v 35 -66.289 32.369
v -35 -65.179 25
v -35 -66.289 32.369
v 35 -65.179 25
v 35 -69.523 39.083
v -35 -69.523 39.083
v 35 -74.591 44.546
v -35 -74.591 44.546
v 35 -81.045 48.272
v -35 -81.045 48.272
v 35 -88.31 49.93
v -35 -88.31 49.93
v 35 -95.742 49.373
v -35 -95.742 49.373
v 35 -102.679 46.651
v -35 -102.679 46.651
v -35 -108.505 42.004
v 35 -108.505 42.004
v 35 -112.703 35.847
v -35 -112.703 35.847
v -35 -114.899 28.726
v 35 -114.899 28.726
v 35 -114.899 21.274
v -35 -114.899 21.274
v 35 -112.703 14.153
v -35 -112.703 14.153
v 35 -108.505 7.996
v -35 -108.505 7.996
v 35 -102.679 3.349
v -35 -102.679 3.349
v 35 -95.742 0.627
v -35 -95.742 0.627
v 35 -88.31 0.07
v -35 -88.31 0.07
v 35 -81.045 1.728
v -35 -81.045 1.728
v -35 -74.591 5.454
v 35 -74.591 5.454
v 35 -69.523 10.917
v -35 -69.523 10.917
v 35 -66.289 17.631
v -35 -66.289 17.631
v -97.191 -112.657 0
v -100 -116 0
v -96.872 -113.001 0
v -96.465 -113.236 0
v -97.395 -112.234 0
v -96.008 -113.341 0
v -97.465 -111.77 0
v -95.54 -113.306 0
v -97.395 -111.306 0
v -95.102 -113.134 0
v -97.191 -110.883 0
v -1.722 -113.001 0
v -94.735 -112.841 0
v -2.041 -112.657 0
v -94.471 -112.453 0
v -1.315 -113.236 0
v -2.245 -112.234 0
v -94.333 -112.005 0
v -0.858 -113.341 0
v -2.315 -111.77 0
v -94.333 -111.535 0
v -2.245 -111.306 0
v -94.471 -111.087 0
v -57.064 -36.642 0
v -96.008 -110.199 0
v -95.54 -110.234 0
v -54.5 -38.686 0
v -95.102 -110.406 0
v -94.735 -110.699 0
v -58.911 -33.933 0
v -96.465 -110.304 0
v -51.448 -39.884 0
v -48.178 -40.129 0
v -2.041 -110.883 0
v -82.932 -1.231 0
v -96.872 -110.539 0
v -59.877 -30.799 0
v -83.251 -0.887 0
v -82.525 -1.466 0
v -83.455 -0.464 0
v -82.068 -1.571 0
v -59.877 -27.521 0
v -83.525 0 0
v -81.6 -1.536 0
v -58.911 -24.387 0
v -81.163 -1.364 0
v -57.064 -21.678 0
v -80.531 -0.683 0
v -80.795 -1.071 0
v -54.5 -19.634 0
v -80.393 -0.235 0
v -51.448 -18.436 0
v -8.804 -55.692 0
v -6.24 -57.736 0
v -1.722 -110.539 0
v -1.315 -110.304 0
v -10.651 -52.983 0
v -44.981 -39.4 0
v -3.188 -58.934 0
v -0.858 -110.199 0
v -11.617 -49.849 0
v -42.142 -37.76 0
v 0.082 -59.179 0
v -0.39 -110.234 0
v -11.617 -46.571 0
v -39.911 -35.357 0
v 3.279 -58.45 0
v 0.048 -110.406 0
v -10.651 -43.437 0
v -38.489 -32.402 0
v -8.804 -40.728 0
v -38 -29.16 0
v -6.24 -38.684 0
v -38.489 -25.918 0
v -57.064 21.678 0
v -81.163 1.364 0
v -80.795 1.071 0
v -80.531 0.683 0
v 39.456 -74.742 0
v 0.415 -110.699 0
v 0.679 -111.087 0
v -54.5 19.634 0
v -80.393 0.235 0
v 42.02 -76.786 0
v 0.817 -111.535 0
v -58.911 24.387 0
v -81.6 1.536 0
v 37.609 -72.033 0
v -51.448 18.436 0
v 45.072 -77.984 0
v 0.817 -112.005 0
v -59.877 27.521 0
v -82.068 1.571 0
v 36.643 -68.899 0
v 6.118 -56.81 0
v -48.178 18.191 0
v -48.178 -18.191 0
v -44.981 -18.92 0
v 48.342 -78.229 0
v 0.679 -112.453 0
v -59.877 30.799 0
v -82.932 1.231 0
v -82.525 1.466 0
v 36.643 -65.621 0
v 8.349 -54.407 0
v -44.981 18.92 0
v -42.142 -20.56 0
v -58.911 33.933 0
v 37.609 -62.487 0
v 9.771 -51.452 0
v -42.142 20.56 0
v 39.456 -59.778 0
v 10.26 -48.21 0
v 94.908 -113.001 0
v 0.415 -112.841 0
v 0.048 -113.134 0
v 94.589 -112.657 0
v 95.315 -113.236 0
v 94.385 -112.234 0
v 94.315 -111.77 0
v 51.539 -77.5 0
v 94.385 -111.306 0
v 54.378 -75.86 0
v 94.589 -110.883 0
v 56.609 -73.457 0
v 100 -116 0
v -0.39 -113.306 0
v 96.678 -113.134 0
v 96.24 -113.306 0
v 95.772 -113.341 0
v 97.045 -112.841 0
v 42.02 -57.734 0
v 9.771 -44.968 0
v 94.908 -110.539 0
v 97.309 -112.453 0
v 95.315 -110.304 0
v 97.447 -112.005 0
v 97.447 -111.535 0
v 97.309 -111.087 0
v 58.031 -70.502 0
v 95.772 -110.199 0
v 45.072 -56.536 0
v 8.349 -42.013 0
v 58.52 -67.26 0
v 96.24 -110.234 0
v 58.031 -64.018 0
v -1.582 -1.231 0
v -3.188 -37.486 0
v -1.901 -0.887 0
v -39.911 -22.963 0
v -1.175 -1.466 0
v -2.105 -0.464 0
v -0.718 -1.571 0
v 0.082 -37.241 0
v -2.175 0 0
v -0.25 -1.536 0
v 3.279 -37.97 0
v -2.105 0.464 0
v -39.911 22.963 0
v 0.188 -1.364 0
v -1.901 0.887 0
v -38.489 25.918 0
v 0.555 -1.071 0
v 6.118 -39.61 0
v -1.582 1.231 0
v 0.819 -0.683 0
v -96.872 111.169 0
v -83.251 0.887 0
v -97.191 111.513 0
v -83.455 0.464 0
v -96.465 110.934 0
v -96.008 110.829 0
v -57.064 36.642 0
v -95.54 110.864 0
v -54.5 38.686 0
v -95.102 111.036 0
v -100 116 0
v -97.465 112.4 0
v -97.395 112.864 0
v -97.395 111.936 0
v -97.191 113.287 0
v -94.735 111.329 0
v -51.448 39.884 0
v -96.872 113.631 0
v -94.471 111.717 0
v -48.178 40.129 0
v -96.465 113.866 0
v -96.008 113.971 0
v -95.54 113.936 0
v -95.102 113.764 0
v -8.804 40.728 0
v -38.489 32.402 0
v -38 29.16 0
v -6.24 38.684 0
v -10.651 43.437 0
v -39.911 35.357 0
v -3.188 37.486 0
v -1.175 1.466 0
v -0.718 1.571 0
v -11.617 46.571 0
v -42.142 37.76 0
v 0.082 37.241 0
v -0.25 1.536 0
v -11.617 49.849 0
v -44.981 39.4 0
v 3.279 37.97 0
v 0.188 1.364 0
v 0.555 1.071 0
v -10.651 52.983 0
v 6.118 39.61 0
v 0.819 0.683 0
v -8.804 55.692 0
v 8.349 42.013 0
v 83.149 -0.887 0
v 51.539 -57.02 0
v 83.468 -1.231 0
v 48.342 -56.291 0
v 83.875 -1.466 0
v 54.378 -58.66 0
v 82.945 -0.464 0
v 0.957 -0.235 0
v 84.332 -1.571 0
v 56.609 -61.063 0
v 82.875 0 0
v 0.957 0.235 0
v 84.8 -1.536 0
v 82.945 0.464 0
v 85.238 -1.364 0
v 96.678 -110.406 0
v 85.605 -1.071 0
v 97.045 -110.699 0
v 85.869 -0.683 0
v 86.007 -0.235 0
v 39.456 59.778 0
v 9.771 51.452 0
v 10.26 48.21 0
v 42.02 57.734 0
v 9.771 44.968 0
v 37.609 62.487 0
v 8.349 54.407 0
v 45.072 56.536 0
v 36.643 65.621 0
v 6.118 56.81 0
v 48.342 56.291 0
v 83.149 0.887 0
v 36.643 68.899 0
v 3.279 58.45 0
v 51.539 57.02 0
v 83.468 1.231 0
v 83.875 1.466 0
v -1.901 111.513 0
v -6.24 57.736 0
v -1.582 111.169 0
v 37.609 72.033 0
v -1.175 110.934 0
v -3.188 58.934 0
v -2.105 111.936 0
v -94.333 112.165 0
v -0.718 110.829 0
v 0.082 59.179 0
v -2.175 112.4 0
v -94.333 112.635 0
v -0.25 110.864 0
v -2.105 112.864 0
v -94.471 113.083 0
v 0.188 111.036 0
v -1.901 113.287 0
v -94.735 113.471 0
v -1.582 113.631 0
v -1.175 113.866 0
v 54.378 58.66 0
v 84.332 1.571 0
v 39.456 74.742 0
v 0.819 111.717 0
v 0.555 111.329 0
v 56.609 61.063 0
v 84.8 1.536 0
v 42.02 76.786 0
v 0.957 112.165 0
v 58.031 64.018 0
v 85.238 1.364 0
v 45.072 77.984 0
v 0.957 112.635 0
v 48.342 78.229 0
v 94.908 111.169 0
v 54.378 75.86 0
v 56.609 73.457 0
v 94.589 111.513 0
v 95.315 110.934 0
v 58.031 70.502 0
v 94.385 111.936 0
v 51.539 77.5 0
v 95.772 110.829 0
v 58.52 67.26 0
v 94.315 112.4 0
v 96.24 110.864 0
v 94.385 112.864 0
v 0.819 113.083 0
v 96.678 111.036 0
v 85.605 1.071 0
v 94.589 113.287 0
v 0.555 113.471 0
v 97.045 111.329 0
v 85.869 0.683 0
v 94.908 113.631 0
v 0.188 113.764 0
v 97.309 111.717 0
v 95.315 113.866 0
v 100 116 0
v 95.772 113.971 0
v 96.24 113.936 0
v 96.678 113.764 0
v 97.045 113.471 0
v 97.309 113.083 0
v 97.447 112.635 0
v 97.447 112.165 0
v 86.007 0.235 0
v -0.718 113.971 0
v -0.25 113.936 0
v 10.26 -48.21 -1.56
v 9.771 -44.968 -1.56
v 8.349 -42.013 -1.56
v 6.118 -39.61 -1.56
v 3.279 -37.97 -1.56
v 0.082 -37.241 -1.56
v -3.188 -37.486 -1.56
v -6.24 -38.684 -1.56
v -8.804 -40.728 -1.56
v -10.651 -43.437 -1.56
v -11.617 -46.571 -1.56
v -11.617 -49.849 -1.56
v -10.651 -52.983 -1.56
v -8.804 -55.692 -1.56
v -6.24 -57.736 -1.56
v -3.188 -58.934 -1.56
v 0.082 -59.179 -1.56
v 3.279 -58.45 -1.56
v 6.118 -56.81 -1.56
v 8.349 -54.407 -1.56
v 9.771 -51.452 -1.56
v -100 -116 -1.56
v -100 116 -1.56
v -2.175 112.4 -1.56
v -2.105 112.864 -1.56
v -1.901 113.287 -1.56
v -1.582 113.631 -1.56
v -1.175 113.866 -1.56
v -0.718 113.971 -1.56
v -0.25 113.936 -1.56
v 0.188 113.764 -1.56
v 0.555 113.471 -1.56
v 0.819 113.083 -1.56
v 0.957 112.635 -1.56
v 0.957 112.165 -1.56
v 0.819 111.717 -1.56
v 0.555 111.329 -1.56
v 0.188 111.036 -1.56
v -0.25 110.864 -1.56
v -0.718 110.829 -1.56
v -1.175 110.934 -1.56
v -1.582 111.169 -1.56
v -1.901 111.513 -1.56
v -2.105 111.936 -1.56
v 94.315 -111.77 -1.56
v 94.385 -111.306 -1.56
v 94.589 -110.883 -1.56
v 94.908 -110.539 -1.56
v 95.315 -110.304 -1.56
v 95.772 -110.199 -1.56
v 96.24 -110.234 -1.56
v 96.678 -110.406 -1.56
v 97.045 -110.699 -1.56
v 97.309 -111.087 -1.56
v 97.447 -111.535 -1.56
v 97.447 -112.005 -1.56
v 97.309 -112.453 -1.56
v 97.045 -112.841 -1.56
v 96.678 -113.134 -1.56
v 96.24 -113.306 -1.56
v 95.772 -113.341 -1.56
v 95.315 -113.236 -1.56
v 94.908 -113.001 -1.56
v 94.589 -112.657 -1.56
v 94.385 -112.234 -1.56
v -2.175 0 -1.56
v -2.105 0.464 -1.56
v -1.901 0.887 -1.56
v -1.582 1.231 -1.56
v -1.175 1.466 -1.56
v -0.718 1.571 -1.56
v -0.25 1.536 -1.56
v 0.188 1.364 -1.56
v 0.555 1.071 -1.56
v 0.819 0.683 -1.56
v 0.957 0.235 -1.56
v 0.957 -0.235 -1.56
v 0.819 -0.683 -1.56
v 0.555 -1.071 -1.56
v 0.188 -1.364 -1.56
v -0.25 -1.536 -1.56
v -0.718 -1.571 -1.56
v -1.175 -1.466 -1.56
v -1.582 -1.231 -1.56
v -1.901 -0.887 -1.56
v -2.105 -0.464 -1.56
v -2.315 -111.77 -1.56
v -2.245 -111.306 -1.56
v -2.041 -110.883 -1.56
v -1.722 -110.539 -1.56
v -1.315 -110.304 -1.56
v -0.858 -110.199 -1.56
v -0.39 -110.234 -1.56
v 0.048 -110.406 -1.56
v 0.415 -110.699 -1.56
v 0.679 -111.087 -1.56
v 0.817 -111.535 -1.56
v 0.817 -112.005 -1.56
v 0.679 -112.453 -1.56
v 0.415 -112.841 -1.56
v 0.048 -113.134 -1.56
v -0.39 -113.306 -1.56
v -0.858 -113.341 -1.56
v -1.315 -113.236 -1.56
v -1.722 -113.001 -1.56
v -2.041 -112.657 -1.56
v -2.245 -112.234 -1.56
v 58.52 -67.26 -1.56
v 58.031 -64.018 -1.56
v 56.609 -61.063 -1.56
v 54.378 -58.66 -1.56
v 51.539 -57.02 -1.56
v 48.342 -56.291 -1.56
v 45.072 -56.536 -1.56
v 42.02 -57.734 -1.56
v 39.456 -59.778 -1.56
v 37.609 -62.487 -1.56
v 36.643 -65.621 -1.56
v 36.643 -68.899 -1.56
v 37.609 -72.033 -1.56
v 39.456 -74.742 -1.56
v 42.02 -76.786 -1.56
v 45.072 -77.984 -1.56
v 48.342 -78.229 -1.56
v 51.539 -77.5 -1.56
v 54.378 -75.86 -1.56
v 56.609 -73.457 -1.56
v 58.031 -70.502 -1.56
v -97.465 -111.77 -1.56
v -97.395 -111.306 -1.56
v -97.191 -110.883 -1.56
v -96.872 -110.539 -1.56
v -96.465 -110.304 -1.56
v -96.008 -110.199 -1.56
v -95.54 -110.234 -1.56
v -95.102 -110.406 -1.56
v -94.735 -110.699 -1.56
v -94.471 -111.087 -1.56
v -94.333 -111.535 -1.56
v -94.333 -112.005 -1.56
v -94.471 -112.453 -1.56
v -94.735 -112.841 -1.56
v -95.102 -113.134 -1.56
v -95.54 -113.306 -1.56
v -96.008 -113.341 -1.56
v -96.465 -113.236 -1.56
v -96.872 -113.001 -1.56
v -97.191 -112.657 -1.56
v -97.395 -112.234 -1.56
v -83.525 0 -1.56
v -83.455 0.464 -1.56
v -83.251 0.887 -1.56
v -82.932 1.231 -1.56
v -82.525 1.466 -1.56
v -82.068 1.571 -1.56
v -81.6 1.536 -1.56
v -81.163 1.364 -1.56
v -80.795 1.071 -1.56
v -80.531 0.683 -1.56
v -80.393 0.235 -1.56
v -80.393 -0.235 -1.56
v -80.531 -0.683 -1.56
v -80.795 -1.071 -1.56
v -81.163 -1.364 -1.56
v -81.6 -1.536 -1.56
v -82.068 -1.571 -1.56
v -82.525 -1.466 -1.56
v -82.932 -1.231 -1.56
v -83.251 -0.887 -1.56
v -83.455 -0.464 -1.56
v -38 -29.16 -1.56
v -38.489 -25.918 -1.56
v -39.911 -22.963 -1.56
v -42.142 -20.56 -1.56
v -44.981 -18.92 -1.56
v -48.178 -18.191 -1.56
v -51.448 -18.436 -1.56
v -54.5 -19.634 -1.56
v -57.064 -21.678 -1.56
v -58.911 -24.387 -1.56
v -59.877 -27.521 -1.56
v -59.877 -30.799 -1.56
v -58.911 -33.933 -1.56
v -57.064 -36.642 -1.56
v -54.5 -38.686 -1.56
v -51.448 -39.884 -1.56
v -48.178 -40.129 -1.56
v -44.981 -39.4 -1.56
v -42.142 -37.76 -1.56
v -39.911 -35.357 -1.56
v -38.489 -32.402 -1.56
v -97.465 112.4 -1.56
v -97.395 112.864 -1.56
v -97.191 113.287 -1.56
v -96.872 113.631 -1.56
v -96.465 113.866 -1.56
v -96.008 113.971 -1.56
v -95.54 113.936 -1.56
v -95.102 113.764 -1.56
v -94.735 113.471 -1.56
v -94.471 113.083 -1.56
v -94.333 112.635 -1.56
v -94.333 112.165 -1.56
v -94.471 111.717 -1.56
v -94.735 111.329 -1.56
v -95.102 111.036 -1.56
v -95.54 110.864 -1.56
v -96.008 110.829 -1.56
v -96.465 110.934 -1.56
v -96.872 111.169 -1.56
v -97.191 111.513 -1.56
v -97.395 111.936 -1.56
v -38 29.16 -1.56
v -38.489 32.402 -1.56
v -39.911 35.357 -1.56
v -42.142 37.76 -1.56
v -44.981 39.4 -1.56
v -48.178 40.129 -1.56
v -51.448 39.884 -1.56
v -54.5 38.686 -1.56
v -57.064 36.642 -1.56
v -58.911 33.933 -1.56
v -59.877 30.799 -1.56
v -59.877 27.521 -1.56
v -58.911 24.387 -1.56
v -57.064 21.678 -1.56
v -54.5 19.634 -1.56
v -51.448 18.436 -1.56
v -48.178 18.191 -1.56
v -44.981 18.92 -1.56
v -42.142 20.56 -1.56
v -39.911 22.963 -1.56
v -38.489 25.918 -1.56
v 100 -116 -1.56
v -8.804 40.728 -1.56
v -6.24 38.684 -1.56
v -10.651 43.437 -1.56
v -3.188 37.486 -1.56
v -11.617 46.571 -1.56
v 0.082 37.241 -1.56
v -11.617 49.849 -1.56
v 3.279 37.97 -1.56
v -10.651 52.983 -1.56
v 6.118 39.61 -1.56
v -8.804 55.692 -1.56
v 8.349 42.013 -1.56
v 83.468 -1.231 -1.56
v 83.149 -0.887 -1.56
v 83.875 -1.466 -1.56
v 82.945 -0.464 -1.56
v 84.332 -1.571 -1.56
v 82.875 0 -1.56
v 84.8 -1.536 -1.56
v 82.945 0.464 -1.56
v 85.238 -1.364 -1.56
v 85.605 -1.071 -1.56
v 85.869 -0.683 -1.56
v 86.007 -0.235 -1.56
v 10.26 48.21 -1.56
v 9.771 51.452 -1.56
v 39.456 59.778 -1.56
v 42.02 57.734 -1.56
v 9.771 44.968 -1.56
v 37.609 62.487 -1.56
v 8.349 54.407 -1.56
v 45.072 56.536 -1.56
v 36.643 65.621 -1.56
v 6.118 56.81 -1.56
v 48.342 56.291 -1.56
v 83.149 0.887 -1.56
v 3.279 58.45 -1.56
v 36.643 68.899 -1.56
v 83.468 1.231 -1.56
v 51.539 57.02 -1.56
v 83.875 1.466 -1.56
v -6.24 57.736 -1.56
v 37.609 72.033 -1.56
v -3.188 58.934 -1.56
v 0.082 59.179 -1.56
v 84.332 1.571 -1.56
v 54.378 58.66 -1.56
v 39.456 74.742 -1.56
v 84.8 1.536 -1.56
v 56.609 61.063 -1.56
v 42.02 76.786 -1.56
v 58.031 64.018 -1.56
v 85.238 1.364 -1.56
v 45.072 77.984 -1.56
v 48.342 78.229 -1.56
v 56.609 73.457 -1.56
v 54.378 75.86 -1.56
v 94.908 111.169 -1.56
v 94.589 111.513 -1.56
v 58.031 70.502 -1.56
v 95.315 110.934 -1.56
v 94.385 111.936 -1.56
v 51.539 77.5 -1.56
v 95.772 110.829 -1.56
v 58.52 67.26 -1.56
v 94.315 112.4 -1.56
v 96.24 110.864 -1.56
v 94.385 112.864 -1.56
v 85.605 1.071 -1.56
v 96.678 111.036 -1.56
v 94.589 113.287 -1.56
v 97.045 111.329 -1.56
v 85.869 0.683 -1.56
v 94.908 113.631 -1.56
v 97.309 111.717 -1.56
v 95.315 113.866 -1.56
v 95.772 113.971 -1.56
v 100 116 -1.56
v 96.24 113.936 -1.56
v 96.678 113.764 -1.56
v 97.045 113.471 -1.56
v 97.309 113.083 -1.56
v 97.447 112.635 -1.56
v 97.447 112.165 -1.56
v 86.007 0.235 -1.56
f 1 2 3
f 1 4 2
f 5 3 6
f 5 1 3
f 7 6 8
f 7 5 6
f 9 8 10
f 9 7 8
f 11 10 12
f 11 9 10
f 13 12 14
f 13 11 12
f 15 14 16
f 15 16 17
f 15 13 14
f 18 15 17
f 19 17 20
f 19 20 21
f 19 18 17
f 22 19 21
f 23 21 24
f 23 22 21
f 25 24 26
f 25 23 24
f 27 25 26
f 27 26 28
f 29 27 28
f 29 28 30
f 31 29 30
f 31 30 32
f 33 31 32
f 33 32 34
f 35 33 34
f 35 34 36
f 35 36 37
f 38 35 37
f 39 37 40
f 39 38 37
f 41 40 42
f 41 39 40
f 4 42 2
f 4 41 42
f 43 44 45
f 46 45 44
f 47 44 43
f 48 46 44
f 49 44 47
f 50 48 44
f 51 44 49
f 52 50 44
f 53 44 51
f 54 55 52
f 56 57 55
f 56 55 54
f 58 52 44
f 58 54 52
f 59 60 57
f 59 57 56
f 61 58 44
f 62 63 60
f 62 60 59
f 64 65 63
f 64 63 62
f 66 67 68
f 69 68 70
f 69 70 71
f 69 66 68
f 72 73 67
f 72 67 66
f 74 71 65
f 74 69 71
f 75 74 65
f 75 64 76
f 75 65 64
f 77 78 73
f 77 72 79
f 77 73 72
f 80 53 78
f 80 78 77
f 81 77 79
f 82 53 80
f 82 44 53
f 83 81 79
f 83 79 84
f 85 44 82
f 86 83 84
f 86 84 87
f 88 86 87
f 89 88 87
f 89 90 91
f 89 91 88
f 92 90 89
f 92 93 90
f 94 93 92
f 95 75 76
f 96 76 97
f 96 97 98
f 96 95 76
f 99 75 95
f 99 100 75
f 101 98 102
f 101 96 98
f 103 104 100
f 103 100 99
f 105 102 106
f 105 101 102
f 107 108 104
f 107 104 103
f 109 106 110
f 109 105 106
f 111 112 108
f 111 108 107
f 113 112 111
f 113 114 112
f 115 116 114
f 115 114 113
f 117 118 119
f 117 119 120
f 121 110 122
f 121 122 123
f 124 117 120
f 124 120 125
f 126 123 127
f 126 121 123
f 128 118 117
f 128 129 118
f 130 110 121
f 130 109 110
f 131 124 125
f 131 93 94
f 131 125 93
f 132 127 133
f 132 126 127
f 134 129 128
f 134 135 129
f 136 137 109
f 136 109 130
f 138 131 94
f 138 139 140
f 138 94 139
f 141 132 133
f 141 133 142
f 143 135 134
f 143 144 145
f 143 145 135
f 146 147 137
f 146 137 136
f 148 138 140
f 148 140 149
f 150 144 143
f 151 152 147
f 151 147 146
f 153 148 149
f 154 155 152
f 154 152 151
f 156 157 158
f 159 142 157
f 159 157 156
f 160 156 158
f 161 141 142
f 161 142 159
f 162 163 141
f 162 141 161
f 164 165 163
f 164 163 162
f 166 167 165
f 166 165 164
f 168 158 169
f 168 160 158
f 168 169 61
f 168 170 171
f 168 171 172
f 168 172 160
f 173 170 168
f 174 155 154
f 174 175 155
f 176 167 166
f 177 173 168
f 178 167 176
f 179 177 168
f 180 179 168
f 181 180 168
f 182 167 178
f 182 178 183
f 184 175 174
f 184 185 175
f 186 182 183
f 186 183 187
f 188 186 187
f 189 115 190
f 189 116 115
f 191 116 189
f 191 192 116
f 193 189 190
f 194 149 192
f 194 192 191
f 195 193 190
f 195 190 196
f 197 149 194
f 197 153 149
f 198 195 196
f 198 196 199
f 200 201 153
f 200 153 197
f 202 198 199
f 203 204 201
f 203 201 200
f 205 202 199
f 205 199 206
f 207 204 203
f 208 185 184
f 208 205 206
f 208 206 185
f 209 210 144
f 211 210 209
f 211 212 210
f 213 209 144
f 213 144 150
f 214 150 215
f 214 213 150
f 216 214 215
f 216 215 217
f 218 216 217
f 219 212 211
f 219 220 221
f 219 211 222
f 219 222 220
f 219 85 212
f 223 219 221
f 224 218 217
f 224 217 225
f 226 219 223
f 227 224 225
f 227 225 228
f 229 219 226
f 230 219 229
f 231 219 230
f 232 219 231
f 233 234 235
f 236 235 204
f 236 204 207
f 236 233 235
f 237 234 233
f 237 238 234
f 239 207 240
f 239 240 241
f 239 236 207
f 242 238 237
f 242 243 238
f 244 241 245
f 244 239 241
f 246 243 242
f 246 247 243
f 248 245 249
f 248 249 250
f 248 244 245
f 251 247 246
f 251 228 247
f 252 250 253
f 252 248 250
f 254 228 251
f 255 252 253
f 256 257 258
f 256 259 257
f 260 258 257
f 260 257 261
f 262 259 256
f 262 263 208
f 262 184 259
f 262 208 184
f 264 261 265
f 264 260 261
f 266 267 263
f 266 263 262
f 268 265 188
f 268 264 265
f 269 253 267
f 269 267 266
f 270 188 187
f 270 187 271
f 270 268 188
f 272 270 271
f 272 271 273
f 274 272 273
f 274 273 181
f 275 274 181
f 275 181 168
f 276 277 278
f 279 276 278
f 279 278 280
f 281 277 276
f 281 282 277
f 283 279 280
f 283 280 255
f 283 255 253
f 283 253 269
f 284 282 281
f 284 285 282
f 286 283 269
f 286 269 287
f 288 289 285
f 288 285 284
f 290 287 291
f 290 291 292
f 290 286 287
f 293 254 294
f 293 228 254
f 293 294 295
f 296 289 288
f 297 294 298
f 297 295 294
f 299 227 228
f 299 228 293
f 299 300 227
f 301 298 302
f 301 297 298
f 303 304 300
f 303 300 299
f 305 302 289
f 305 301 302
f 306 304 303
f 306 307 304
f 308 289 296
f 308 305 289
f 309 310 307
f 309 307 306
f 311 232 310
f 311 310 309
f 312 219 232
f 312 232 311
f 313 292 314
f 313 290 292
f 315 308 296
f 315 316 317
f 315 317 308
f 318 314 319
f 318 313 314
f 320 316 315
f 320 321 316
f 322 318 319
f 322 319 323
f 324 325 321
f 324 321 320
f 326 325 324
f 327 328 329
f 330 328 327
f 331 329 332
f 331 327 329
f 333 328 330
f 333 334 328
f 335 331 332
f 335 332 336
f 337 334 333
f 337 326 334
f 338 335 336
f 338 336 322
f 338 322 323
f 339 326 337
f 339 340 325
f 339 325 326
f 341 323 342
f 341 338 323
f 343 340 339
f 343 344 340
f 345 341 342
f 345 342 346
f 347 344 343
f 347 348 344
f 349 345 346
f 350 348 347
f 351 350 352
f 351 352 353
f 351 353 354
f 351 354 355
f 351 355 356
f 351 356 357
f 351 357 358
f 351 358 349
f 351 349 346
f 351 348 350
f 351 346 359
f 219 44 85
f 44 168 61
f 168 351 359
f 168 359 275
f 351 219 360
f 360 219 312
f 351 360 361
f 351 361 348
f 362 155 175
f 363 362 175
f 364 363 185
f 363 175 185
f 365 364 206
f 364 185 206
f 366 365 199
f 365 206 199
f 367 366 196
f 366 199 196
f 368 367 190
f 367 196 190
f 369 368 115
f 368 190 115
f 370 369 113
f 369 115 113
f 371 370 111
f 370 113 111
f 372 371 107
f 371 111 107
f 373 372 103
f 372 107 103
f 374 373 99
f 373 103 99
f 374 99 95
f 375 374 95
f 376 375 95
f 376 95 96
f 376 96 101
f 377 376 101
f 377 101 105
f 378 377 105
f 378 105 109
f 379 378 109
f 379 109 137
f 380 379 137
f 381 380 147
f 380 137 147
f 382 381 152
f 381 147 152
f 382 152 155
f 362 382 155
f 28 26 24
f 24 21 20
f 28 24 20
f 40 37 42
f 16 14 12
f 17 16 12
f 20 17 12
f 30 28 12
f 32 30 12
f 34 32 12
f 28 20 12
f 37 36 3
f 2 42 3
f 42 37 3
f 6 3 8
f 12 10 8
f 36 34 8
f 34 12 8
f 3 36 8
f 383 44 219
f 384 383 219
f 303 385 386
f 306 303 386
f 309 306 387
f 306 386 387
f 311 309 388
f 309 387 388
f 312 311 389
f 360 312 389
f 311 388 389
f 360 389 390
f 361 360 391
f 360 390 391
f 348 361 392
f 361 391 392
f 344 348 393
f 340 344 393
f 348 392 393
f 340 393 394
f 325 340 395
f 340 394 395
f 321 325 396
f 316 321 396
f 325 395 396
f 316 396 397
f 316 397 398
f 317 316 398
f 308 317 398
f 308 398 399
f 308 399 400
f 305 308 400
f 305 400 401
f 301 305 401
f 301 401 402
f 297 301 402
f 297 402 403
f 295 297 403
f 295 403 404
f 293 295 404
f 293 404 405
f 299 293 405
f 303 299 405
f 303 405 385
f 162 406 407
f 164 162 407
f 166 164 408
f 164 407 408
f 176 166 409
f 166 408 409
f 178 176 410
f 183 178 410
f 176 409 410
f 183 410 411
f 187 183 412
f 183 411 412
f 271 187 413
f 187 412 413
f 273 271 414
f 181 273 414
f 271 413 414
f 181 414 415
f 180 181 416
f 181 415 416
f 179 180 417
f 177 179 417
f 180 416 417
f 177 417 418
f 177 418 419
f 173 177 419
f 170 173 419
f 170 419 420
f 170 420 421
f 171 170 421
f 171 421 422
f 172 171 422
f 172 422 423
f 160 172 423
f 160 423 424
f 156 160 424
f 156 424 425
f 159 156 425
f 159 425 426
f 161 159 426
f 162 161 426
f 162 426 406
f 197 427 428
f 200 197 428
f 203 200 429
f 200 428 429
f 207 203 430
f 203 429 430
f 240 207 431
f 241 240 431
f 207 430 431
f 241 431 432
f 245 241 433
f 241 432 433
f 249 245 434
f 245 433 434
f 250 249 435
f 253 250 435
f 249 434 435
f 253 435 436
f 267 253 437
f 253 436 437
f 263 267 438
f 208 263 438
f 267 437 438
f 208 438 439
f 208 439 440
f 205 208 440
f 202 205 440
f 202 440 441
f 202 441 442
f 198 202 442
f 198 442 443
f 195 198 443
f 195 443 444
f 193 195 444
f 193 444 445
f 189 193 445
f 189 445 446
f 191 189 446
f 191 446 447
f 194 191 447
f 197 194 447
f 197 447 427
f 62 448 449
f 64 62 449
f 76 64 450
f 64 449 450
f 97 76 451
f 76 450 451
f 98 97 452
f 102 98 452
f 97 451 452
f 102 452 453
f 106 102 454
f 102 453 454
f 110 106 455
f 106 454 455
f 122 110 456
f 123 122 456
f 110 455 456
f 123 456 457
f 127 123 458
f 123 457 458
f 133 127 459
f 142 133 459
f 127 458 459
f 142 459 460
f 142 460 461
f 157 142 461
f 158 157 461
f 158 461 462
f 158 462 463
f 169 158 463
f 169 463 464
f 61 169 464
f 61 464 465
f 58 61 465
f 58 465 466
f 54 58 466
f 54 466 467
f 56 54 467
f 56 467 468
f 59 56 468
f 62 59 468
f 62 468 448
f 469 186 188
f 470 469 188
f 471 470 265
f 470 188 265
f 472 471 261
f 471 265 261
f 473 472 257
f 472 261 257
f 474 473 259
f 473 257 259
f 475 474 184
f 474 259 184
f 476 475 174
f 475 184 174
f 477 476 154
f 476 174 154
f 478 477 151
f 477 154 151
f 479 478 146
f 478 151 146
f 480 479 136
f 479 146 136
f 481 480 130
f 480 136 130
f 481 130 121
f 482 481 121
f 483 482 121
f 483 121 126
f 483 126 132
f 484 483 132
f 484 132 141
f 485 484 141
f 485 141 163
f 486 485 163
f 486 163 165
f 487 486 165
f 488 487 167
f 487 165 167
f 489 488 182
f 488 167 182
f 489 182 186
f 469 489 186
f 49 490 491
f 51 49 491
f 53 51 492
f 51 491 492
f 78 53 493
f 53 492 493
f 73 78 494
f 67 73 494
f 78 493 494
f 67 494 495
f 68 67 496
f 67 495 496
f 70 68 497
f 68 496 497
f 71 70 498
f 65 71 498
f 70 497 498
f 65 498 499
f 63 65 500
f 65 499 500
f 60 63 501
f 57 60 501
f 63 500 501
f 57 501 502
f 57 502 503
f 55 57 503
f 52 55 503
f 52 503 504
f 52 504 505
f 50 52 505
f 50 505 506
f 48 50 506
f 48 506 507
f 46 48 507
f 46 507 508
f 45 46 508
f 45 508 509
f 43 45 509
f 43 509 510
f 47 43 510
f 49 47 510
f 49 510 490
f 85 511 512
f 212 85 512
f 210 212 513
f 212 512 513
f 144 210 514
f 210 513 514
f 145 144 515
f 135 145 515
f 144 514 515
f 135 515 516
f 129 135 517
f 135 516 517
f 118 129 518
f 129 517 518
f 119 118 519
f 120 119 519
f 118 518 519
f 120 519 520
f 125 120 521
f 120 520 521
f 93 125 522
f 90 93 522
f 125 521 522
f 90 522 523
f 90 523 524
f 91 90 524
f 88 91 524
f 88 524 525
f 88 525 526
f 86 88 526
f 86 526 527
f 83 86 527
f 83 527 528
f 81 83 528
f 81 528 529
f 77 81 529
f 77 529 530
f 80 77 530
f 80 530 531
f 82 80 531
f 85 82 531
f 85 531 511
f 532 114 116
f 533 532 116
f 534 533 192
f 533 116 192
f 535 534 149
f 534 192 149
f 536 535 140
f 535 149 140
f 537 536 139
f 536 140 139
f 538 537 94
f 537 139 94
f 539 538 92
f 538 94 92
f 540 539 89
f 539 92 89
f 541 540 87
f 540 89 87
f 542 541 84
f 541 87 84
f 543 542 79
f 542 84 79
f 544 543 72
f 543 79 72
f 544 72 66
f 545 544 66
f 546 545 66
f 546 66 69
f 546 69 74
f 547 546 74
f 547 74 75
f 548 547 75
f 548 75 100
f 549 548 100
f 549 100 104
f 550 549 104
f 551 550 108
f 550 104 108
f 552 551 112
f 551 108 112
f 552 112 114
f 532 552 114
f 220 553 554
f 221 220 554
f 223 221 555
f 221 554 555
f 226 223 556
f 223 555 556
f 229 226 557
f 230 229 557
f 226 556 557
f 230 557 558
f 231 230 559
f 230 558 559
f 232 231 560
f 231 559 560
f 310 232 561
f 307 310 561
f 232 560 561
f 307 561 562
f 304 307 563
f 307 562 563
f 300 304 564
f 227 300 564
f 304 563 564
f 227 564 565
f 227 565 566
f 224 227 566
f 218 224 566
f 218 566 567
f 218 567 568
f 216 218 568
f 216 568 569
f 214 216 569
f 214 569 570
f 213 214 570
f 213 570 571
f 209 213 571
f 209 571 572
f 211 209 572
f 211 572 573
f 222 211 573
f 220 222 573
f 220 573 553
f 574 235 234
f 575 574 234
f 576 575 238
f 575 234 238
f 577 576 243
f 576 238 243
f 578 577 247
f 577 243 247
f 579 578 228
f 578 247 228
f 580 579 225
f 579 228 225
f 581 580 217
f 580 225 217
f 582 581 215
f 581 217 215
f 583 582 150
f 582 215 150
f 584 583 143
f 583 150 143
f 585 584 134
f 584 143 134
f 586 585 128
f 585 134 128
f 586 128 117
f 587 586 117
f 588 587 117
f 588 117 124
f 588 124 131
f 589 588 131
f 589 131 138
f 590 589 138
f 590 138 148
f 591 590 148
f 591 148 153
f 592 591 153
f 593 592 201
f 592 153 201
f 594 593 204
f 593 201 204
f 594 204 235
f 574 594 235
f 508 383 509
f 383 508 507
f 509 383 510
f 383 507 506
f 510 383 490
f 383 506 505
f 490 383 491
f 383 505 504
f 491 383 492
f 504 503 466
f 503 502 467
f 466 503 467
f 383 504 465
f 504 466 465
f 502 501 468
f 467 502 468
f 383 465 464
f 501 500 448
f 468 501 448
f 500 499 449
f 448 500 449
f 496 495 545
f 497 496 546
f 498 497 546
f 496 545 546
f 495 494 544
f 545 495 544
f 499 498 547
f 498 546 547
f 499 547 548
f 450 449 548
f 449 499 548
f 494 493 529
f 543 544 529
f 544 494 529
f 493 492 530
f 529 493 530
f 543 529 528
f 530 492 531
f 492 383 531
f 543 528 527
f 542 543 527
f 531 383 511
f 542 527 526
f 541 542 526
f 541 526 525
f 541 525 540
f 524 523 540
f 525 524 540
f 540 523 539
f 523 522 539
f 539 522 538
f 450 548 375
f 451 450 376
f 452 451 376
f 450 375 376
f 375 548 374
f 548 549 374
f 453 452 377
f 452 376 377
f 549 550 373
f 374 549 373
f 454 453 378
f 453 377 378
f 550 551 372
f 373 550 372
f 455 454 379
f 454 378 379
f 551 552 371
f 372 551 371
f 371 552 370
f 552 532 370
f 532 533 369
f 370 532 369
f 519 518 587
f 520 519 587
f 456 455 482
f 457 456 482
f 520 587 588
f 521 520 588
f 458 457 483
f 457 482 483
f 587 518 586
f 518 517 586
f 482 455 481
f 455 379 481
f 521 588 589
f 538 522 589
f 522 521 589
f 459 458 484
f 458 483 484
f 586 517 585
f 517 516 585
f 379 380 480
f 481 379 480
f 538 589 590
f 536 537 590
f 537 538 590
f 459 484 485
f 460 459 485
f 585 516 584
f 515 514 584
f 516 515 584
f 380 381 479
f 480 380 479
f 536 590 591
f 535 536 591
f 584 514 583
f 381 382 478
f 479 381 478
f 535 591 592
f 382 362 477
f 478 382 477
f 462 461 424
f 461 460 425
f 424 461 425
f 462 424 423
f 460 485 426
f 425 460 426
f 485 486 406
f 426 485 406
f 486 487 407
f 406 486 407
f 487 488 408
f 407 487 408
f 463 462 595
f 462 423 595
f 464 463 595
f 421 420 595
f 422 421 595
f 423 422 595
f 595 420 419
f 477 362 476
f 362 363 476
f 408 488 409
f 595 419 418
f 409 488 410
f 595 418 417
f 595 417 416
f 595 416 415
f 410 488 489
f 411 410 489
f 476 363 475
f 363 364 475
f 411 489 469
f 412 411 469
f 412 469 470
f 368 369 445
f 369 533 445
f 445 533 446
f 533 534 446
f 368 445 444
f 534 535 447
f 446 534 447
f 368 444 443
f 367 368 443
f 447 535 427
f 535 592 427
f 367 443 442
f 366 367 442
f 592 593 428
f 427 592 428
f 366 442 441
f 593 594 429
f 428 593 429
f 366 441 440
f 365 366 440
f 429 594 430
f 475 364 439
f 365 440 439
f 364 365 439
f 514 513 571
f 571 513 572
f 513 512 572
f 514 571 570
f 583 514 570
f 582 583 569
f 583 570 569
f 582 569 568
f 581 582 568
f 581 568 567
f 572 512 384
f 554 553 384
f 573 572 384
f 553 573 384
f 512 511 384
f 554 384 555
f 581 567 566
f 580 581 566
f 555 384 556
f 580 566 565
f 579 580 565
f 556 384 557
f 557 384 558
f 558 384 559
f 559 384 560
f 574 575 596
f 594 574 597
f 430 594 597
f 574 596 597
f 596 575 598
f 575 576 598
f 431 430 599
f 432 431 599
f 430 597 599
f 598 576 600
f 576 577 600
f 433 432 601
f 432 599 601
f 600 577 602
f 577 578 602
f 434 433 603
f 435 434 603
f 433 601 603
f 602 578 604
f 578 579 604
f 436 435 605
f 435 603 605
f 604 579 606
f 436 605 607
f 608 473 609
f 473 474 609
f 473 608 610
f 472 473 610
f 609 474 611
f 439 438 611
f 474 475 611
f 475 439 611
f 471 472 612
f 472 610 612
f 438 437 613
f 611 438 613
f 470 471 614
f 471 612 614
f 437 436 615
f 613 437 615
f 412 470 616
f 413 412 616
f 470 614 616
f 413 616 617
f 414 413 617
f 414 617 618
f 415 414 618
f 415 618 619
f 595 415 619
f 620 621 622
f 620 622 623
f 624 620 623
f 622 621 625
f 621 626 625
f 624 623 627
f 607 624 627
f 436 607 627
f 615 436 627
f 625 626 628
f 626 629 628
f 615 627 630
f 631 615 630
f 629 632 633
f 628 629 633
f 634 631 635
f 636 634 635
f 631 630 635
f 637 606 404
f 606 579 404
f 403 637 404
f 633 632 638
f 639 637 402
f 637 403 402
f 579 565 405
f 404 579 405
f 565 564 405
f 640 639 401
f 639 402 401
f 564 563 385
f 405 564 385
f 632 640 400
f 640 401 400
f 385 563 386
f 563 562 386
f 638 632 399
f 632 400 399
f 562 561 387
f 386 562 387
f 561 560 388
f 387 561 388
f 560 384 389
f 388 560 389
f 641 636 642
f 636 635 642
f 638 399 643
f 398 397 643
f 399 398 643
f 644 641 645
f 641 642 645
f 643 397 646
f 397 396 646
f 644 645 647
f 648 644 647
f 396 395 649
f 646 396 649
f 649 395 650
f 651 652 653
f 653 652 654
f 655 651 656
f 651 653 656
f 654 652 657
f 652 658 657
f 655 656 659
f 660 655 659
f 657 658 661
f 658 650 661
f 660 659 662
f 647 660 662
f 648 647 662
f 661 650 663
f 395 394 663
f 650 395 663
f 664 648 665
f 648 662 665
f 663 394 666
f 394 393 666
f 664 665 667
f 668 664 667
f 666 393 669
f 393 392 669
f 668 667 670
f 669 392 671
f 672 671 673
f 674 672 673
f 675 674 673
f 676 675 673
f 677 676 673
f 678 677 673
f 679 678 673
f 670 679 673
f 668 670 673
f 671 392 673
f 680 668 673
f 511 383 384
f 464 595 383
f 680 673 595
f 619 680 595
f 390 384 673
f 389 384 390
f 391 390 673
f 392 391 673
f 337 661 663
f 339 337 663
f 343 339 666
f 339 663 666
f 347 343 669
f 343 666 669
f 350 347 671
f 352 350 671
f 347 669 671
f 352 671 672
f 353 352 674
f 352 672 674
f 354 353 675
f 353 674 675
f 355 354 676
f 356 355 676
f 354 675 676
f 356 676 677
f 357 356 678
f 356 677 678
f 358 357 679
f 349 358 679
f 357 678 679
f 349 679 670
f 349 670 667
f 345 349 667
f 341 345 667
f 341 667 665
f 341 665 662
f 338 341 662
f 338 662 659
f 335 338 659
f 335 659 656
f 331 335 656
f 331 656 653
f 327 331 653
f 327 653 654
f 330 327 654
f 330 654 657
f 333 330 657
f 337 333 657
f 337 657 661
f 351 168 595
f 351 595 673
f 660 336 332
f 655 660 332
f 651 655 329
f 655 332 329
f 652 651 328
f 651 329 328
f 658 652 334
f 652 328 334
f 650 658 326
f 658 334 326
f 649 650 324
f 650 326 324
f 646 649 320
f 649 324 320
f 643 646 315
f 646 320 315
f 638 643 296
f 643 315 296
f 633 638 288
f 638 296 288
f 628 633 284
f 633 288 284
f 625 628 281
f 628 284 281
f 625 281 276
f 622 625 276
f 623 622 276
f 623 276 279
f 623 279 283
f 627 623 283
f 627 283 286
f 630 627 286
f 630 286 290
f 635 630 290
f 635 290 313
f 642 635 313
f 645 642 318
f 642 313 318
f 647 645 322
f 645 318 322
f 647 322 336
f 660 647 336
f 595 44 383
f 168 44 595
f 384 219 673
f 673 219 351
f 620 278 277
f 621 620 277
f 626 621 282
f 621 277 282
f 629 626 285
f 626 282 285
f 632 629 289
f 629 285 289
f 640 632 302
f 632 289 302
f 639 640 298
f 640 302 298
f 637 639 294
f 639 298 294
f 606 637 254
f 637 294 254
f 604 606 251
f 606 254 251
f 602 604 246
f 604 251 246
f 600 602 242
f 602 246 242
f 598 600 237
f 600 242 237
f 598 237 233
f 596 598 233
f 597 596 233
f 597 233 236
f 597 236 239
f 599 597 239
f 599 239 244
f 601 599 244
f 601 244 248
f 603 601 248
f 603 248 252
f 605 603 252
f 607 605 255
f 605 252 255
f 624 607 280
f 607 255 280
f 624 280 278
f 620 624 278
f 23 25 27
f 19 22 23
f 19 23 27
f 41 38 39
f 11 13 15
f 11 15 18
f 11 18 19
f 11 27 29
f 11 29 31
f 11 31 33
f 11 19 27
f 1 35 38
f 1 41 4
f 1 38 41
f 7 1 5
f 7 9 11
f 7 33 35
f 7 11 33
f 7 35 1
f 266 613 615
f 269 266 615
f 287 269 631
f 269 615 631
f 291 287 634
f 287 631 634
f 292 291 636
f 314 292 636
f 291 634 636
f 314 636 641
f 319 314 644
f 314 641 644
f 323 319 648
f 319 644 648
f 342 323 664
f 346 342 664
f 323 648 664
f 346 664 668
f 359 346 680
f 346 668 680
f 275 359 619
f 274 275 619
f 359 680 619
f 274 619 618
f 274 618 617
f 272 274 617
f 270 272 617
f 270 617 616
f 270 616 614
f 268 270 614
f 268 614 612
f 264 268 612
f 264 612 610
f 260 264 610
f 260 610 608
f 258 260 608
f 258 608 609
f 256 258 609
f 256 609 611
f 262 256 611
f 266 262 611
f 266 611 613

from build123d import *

# Parameters (mm, degrees)
F0_W     = 200
F0_H     = 232
F0_R     = 11
F1_DEPTH = 1.56
F2_D     = 3.15
F3_D     = 3.15
F4_R     = 25
F5_DEPTH = 35


with BuildPart() as f1:
    # F0 (on Top) → F1 (new body)
    with BuildSketch(Plane.XY):
        Rectangle(F0_W, F0_H)
        with Locations((-49, -29.16)):
            Circle(F0_R, mode=Mode.SUBTRACT)
        with Locations((-0.74, -48.21)):
            Circle(F0_R, mode=Mode.SUBTRACT)
        with Locations((47.52, -67.26)):
            Circle(F0_R, mode=Mode.SUBTRACT)
        with Locations((-49, 29.16)):
            Circle(F0_R, mode=Mode.SUBTRACT)
        with Locations((-0.74, 48.21)):
            Circle(F0_R, mode=Mode.SUBTRACT)
        with Locations((47.52, 67.26)):
            Circle(F0_R, mode=Mode.SUBTRACT)
    extrude(amount=-F1_DEPTH)

    # F2 (through all)
    with Locations(Plane.XY):
        with Locations((-95.89, 112.4)):
            Hole(F2_D / 2)

    # F3 (through all)
    with Locations(Plane.XY):
        with Locations((-0.6, 112.4), (95.89, 112.4), (84.45, 0), (-81.95, 0), (-0.6, 0), (-0.74, -111.77), (-95.89, -111.77), (95.89, -111.77)):
            Hole(F3_D / 2)


with BuildPart() as f5:
    # F4 (on Right) → F5 (new body, symmetric)
    with BuildSketch(Plane.YZ):
        with Locations((-90.178728, 25)):
            Circle(F4_R)
    extrude(amount=F5_DEPTH, both=True)


solid = Compound([f1.part, f5.part])
